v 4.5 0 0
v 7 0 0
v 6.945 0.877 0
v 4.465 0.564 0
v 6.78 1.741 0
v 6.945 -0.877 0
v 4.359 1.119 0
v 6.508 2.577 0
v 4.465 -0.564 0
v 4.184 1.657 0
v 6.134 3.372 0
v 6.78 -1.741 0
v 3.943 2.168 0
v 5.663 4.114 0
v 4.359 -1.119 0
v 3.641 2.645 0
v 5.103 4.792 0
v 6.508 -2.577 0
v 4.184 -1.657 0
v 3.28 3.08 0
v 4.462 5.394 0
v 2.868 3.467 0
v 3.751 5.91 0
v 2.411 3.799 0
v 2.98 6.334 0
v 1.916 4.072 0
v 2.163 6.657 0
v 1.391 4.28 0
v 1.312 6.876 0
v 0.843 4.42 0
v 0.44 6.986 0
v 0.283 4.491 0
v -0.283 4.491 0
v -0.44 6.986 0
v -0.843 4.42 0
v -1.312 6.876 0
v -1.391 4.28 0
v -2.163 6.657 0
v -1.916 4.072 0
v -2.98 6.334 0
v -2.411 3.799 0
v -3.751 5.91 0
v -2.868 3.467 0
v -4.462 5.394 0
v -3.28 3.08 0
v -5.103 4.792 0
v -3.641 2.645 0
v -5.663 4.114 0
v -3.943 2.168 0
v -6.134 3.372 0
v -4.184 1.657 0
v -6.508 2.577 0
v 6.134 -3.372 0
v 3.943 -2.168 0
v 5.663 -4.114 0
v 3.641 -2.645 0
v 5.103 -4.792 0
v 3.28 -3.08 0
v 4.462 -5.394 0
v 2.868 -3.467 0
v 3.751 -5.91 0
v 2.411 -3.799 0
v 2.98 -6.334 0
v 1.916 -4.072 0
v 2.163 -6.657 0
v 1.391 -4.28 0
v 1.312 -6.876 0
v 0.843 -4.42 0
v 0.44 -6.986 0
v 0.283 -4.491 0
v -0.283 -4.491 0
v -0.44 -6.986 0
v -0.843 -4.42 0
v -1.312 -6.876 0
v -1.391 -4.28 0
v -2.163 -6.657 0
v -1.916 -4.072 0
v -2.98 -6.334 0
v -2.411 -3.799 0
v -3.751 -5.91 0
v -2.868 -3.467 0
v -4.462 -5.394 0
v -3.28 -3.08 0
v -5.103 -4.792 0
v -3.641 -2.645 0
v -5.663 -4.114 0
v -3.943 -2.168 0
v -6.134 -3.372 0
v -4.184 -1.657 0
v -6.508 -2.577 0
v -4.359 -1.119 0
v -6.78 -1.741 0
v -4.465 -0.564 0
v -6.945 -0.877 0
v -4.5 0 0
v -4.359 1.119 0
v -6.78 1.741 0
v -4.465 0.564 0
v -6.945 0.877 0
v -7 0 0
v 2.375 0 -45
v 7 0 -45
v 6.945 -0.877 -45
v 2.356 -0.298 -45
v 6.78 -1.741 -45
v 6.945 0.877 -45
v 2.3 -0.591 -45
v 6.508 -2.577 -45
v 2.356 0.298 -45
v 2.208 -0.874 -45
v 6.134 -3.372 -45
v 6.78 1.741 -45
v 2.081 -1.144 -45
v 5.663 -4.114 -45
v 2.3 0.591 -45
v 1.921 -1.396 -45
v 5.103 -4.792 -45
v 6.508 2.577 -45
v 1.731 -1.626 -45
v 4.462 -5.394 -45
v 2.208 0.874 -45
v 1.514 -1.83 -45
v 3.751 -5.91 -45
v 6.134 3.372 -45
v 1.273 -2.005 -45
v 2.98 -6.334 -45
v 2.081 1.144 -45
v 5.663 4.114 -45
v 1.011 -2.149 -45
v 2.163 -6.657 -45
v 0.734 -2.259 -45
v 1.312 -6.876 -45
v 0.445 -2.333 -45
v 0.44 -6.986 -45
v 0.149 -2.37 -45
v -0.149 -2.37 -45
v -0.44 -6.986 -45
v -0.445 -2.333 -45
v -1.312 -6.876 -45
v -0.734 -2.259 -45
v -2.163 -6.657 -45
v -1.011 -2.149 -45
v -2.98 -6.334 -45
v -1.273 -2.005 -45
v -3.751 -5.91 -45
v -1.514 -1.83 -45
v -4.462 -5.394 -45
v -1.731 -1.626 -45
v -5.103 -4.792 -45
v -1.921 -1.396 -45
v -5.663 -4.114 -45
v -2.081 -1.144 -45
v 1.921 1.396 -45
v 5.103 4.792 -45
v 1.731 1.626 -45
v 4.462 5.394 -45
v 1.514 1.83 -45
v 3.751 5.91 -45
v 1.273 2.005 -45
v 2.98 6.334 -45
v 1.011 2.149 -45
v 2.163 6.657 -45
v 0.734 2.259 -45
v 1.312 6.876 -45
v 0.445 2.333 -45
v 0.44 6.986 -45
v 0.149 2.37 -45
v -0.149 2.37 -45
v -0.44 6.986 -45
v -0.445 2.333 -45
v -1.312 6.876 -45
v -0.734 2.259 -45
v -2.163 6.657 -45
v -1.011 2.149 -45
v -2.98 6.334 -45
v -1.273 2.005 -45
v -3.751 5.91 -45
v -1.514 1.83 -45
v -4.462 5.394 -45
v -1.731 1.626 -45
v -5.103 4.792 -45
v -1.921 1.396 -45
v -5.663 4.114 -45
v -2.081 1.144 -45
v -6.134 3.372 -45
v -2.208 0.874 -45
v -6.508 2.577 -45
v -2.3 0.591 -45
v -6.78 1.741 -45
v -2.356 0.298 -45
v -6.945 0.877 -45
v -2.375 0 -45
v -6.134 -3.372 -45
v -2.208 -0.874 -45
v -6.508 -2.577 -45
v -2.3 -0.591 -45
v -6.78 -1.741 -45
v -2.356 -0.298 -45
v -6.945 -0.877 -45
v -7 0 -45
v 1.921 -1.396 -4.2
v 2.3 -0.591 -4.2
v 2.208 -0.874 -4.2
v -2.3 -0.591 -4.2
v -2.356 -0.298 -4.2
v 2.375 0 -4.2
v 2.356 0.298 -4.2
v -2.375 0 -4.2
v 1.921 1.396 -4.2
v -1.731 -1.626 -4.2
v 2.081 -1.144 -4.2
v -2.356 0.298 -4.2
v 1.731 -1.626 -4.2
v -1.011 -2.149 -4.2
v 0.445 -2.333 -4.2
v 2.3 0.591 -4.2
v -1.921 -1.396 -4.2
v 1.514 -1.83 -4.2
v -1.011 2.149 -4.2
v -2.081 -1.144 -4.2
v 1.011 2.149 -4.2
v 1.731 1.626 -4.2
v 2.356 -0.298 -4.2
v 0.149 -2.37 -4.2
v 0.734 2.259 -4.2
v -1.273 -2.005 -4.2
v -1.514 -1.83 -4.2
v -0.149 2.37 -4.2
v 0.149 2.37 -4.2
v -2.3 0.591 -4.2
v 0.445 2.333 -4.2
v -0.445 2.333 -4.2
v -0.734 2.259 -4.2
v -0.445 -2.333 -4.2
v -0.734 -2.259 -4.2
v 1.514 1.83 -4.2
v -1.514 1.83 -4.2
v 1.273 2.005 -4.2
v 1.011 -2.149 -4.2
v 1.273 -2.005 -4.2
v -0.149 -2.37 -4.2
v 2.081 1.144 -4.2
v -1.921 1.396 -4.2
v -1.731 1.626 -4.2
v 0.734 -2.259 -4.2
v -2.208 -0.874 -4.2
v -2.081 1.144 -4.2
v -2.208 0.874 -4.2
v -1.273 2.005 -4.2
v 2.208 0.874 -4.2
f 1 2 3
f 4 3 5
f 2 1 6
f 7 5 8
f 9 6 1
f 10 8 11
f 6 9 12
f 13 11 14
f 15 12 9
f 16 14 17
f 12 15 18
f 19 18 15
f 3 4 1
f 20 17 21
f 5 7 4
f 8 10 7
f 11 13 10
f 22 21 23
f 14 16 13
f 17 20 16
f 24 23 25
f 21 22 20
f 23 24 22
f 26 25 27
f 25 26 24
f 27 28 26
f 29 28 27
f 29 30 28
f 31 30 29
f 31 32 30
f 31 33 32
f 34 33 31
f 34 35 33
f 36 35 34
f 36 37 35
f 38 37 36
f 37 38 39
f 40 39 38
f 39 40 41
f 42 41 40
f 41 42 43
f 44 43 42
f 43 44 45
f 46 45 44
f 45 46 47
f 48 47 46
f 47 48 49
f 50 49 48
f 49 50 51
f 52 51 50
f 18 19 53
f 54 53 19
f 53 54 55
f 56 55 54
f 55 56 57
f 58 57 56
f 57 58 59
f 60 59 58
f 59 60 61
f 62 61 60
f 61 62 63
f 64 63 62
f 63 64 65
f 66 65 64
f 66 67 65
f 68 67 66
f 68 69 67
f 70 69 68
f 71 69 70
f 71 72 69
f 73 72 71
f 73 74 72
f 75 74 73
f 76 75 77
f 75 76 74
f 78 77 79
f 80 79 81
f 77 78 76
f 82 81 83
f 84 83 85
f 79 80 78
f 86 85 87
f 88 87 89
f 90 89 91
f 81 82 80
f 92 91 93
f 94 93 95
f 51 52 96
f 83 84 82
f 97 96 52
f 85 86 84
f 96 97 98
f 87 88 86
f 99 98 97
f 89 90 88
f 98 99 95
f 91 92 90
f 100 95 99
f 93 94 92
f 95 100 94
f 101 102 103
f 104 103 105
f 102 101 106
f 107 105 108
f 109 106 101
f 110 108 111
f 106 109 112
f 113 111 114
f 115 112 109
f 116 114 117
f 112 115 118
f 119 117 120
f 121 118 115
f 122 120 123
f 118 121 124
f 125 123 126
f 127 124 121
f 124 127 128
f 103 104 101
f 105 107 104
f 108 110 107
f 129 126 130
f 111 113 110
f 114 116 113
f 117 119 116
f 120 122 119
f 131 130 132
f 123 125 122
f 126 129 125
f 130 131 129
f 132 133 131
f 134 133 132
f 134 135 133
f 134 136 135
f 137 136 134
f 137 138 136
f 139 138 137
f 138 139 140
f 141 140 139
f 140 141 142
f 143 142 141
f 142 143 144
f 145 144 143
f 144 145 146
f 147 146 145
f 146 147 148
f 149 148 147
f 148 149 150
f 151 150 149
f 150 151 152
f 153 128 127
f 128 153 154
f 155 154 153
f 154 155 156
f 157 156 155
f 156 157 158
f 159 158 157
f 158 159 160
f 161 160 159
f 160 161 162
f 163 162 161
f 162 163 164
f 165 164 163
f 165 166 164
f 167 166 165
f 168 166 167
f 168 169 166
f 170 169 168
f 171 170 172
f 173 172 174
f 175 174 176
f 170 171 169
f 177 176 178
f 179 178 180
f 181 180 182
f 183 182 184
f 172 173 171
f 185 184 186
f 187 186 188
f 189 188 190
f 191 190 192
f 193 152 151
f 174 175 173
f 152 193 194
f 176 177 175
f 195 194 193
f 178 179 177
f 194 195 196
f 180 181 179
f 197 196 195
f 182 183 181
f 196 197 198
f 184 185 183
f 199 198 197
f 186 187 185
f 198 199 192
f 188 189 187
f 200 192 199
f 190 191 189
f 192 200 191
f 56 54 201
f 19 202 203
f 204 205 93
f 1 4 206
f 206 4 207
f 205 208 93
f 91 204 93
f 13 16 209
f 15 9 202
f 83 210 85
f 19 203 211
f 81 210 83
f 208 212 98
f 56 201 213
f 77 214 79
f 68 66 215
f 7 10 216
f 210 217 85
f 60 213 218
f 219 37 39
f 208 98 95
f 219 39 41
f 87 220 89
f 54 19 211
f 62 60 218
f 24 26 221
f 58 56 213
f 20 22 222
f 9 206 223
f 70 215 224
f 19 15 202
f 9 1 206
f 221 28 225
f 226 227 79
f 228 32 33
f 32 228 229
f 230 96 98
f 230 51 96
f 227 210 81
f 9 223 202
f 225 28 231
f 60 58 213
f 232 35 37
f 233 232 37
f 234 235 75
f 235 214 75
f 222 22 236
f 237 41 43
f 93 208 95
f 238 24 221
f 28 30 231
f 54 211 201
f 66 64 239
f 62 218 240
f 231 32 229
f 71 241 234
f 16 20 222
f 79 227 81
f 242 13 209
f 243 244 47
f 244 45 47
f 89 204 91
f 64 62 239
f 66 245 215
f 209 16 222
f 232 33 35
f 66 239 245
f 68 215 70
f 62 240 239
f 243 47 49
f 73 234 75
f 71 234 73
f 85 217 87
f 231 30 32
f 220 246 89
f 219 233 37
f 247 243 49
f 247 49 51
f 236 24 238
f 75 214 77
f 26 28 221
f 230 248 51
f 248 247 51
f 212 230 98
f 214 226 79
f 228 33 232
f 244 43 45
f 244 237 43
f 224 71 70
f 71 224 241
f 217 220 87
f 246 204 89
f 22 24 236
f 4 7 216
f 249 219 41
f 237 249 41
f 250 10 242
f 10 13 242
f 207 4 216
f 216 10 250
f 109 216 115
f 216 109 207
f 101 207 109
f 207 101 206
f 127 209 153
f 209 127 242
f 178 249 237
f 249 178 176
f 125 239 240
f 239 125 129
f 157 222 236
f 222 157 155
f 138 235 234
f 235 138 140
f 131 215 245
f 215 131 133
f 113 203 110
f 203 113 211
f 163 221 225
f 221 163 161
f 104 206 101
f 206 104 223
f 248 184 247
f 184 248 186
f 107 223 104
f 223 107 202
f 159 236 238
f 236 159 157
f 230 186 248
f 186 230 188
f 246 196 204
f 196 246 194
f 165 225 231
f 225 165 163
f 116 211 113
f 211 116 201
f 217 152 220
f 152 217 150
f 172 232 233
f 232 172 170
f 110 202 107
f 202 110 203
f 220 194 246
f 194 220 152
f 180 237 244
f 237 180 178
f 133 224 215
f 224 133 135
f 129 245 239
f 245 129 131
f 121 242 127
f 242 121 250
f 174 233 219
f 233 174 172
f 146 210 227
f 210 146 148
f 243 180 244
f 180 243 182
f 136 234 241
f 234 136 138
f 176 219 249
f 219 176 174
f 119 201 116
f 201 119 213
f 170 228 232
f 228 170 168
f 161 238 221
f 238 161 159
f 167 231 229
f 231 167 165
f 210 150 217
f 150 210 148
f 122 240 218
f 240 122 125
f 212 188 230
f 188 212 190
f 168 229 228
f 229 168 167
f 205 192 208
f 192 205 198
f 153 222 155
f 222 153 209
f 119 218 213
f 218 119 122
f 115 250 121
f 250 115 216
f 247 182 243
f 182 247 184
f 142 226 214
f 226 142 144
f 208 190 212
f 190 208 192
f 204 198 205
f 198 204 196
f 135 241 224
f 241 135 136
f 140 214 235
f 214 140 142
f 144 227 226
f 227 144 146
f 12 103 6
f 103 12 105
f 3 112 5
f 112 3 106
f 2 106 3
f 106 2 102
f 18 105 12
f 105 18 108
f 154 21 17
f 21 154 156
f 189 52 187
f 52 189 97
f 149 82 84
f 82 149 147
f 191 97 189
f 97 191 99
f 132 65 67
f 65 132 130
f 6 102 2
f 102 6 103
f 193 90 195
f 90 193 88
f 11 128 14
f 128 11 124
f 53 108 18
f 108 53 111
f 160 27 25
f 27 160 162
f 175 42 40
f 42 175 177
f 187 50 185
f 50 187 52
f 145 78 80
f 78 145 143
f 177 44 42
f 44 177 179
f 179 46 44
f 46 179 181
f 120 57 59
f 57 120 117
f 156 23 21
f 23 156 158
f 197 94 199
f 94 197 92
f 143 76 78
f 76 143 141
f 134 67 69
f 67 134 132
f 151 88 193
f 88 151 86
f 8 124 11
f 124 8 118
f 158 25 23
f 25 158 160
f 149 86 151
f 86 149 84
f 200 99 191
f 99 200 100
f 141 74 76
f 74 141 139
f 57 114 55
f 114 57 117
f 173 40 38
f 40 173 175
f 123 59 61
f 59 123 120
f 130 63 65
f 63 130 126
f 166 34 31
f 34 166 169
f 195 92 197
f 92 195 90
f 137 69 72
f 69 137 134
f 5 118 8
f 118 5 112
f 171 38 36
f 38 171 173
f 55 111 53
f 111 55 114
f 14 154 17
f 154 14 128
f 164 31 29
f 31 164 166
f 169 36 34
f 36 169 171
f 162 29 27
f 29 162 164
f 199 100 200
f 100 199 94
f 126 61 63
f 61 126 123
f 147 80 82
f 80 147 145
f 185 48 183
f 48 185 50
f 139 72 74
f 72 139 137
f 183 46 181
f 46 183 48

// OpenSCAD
$fn = 50;


difference() {
	union() {
		translate(v = [0, 0, -45.0000000000]) {
			cylinder(h = 45, r = 7.0000000000);
		}
		cylinder(h = 0, r = 10.0000000000);
	}
	union() {
		translate(v = [0, 0, 0]) {
			rotate(a = [0, 0, 0]) {
				difference() {
					union() {
						#translate(v = [0, 0, -45.0000000000]) {
							cylinder(h = 45, r = 2.2500000000);
						}
						#translate(v = [0, 0, -4.2000000000]) {
							cylinder(h = 4.2000000000, r1 = 2.3750000000, r2 = 4.5000000000);
						}
						#translate(v = [0, 0, -45.0000000000]) {
							cylinder(h = 45, r = 2.3750000000);
						}
						#translate(v = [0, 0, -45.0000000000]) {
							cylinder(h = 45, r = 2.2500000000);
						}
					}
					union();
				}
			}
		}
	}
}
